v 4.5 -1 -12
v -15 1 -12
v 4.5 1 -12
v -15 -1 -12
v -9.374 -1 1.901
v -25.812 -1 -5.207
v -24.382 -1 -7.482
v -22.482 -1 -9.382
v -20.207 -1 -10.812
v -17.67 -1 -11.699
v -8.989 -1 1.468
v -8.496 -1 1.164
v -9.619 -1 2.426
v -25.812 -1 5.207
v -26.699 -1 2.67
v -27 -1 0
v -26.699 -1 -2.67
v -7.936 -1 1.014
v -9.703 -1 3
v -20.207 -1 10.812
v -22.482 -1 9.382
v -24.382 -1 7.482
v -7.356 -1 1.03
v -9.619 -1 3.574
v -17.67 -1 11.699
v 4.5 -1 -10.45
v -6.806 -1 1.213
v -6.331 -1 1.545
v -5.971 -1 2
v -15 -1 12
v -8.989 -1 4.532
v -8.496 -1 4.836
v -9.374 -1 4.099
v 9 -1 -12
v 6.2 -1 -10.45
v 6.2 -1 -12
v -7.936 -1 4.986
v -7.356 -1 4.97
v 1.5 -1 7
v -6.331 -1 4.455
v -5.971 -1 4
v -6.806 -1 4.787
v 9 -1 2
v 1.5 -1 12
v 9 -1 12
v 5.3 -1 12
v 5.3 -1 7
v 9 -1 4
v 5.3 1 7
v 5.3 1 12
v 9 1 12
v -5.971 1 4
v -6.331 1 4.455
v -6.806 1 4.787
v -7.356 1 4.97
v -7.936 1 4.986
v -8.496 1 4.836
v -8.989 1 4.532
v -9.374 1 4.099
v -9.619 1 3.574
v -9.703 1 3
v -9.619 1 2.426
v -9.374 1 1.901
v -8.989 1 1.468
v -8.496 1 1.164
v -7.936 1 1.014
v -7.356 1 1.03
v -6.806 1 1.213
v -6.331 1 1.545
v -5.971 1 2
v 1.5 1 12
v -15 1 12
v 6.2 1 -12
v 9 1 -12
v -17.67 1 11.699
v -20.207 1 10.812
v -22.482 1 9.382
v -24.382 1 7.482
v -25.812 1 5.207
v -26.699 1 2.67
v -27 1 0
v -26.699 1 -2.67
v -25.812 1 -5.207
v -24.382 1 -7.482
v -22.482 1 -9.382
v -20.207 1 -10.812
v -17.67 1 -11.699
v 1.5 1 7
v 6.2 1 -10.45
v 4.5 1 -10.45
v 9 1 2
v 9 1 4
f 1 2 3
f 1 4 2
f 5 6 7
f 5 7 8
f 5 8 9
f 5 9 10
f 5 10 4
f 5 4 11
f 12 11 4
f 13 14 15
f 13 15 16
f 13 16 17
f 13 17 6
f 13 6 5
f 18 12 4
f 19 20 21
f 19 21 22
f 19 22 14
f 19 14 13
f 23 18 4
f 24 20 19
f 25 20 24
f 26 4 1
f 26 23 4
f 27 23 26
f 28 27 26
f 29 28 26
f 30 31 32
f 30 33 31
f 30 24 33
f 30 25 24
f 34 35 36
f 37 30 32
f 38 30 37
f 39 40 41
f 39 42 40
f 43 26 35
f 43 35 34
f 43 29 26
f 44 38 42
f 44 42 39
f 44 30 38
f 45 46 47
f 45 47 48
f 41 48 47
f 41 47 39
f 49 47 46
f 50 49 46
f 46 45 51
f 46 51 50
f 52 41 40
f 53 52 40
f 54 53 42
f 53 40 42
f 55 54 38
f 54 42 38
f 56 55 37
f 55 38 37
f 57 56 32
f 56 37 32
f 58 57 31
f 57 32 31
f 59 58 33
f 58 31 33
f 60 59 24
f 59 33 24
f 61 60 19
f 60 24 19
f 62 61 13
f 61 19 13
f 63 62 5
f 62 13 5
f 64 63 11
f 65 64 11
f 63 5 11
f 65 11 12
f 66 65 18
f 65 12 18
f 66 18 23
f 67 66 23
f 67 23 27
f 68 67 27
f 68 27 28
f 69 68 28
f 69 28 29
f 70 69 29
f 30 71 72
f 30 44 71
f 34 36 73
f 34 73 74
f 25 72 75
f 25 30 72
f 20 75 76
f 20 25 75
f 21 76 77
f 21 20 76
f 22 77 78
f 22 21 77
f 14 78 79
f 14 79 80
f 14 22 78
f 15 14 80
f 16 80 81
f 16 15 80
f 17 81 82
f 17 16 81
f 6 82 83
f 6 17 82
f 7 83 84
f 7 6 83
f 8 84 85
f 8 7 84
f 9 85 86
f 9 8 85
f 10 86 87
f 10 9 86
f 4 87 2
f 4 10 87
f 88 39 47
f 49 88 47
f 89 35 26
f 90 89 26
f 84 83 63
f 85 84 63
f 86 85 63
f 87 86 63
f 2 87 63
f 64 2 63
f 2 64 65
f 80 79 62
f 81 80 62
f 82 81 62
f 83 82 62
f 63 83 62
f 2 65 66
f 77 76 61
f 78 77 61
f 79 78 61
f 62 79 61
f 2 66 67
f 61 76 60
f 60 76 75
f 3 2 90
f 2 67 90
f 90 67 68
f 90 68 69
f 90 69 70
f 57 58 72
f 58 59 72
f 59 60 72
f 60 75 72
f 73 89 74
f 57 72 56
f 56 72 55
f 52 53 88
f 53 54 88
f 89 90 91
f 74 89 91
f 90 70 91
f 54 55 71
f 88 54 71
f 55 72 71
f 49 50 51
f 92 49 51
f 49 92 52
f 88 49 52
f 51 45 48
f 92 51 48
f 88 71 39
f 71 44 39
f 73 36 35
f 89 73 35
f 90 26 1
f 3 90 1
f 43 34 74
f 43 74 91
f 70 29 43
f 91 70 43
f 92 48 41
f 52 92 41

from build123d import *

# Parameters (mm, degrees)
PAD_DEPTH = 1


with BuildPart() as part:
    # Sketch → Pad (new body, symmetric)
    with BuildSketch(Plane.XZ):
        with BuildLine():
            Line((-15, -12), (4.5, -12))
            Line((4.5, -10.45), (4.5, -12))
            Line((6.2, -10.45), (4.5, -10.45))
            Line((6.2, -12), (6.2, -10.45))
            Line((6.2, -12), (9, -12))
            Line((9, -12), (9, 2))
            Line((-5.9714, 2), (9, 2))
            ThreePointArc((-5.9714, 4), (-9.70345, 3), (-5.9714, 2))
            Line((9, 4), (-5.9714, 4))
            Line((9, 12), (9, 4))
            Line((9, 12), (5.3, 12))
            Line((5.3, 7), (5.3, 12))
            Line((1.5, 7), (5.3, 7))
            Line((1.5, 12), (1.5, 7))
            Line((1.5, 12), (-15, 12))
            ThreePointArc((-15, 12), (-27, 0), (-15, -12))
        make_face()
    extrude(amount=PAD_DEPTH, both=True)


solid = part.part
